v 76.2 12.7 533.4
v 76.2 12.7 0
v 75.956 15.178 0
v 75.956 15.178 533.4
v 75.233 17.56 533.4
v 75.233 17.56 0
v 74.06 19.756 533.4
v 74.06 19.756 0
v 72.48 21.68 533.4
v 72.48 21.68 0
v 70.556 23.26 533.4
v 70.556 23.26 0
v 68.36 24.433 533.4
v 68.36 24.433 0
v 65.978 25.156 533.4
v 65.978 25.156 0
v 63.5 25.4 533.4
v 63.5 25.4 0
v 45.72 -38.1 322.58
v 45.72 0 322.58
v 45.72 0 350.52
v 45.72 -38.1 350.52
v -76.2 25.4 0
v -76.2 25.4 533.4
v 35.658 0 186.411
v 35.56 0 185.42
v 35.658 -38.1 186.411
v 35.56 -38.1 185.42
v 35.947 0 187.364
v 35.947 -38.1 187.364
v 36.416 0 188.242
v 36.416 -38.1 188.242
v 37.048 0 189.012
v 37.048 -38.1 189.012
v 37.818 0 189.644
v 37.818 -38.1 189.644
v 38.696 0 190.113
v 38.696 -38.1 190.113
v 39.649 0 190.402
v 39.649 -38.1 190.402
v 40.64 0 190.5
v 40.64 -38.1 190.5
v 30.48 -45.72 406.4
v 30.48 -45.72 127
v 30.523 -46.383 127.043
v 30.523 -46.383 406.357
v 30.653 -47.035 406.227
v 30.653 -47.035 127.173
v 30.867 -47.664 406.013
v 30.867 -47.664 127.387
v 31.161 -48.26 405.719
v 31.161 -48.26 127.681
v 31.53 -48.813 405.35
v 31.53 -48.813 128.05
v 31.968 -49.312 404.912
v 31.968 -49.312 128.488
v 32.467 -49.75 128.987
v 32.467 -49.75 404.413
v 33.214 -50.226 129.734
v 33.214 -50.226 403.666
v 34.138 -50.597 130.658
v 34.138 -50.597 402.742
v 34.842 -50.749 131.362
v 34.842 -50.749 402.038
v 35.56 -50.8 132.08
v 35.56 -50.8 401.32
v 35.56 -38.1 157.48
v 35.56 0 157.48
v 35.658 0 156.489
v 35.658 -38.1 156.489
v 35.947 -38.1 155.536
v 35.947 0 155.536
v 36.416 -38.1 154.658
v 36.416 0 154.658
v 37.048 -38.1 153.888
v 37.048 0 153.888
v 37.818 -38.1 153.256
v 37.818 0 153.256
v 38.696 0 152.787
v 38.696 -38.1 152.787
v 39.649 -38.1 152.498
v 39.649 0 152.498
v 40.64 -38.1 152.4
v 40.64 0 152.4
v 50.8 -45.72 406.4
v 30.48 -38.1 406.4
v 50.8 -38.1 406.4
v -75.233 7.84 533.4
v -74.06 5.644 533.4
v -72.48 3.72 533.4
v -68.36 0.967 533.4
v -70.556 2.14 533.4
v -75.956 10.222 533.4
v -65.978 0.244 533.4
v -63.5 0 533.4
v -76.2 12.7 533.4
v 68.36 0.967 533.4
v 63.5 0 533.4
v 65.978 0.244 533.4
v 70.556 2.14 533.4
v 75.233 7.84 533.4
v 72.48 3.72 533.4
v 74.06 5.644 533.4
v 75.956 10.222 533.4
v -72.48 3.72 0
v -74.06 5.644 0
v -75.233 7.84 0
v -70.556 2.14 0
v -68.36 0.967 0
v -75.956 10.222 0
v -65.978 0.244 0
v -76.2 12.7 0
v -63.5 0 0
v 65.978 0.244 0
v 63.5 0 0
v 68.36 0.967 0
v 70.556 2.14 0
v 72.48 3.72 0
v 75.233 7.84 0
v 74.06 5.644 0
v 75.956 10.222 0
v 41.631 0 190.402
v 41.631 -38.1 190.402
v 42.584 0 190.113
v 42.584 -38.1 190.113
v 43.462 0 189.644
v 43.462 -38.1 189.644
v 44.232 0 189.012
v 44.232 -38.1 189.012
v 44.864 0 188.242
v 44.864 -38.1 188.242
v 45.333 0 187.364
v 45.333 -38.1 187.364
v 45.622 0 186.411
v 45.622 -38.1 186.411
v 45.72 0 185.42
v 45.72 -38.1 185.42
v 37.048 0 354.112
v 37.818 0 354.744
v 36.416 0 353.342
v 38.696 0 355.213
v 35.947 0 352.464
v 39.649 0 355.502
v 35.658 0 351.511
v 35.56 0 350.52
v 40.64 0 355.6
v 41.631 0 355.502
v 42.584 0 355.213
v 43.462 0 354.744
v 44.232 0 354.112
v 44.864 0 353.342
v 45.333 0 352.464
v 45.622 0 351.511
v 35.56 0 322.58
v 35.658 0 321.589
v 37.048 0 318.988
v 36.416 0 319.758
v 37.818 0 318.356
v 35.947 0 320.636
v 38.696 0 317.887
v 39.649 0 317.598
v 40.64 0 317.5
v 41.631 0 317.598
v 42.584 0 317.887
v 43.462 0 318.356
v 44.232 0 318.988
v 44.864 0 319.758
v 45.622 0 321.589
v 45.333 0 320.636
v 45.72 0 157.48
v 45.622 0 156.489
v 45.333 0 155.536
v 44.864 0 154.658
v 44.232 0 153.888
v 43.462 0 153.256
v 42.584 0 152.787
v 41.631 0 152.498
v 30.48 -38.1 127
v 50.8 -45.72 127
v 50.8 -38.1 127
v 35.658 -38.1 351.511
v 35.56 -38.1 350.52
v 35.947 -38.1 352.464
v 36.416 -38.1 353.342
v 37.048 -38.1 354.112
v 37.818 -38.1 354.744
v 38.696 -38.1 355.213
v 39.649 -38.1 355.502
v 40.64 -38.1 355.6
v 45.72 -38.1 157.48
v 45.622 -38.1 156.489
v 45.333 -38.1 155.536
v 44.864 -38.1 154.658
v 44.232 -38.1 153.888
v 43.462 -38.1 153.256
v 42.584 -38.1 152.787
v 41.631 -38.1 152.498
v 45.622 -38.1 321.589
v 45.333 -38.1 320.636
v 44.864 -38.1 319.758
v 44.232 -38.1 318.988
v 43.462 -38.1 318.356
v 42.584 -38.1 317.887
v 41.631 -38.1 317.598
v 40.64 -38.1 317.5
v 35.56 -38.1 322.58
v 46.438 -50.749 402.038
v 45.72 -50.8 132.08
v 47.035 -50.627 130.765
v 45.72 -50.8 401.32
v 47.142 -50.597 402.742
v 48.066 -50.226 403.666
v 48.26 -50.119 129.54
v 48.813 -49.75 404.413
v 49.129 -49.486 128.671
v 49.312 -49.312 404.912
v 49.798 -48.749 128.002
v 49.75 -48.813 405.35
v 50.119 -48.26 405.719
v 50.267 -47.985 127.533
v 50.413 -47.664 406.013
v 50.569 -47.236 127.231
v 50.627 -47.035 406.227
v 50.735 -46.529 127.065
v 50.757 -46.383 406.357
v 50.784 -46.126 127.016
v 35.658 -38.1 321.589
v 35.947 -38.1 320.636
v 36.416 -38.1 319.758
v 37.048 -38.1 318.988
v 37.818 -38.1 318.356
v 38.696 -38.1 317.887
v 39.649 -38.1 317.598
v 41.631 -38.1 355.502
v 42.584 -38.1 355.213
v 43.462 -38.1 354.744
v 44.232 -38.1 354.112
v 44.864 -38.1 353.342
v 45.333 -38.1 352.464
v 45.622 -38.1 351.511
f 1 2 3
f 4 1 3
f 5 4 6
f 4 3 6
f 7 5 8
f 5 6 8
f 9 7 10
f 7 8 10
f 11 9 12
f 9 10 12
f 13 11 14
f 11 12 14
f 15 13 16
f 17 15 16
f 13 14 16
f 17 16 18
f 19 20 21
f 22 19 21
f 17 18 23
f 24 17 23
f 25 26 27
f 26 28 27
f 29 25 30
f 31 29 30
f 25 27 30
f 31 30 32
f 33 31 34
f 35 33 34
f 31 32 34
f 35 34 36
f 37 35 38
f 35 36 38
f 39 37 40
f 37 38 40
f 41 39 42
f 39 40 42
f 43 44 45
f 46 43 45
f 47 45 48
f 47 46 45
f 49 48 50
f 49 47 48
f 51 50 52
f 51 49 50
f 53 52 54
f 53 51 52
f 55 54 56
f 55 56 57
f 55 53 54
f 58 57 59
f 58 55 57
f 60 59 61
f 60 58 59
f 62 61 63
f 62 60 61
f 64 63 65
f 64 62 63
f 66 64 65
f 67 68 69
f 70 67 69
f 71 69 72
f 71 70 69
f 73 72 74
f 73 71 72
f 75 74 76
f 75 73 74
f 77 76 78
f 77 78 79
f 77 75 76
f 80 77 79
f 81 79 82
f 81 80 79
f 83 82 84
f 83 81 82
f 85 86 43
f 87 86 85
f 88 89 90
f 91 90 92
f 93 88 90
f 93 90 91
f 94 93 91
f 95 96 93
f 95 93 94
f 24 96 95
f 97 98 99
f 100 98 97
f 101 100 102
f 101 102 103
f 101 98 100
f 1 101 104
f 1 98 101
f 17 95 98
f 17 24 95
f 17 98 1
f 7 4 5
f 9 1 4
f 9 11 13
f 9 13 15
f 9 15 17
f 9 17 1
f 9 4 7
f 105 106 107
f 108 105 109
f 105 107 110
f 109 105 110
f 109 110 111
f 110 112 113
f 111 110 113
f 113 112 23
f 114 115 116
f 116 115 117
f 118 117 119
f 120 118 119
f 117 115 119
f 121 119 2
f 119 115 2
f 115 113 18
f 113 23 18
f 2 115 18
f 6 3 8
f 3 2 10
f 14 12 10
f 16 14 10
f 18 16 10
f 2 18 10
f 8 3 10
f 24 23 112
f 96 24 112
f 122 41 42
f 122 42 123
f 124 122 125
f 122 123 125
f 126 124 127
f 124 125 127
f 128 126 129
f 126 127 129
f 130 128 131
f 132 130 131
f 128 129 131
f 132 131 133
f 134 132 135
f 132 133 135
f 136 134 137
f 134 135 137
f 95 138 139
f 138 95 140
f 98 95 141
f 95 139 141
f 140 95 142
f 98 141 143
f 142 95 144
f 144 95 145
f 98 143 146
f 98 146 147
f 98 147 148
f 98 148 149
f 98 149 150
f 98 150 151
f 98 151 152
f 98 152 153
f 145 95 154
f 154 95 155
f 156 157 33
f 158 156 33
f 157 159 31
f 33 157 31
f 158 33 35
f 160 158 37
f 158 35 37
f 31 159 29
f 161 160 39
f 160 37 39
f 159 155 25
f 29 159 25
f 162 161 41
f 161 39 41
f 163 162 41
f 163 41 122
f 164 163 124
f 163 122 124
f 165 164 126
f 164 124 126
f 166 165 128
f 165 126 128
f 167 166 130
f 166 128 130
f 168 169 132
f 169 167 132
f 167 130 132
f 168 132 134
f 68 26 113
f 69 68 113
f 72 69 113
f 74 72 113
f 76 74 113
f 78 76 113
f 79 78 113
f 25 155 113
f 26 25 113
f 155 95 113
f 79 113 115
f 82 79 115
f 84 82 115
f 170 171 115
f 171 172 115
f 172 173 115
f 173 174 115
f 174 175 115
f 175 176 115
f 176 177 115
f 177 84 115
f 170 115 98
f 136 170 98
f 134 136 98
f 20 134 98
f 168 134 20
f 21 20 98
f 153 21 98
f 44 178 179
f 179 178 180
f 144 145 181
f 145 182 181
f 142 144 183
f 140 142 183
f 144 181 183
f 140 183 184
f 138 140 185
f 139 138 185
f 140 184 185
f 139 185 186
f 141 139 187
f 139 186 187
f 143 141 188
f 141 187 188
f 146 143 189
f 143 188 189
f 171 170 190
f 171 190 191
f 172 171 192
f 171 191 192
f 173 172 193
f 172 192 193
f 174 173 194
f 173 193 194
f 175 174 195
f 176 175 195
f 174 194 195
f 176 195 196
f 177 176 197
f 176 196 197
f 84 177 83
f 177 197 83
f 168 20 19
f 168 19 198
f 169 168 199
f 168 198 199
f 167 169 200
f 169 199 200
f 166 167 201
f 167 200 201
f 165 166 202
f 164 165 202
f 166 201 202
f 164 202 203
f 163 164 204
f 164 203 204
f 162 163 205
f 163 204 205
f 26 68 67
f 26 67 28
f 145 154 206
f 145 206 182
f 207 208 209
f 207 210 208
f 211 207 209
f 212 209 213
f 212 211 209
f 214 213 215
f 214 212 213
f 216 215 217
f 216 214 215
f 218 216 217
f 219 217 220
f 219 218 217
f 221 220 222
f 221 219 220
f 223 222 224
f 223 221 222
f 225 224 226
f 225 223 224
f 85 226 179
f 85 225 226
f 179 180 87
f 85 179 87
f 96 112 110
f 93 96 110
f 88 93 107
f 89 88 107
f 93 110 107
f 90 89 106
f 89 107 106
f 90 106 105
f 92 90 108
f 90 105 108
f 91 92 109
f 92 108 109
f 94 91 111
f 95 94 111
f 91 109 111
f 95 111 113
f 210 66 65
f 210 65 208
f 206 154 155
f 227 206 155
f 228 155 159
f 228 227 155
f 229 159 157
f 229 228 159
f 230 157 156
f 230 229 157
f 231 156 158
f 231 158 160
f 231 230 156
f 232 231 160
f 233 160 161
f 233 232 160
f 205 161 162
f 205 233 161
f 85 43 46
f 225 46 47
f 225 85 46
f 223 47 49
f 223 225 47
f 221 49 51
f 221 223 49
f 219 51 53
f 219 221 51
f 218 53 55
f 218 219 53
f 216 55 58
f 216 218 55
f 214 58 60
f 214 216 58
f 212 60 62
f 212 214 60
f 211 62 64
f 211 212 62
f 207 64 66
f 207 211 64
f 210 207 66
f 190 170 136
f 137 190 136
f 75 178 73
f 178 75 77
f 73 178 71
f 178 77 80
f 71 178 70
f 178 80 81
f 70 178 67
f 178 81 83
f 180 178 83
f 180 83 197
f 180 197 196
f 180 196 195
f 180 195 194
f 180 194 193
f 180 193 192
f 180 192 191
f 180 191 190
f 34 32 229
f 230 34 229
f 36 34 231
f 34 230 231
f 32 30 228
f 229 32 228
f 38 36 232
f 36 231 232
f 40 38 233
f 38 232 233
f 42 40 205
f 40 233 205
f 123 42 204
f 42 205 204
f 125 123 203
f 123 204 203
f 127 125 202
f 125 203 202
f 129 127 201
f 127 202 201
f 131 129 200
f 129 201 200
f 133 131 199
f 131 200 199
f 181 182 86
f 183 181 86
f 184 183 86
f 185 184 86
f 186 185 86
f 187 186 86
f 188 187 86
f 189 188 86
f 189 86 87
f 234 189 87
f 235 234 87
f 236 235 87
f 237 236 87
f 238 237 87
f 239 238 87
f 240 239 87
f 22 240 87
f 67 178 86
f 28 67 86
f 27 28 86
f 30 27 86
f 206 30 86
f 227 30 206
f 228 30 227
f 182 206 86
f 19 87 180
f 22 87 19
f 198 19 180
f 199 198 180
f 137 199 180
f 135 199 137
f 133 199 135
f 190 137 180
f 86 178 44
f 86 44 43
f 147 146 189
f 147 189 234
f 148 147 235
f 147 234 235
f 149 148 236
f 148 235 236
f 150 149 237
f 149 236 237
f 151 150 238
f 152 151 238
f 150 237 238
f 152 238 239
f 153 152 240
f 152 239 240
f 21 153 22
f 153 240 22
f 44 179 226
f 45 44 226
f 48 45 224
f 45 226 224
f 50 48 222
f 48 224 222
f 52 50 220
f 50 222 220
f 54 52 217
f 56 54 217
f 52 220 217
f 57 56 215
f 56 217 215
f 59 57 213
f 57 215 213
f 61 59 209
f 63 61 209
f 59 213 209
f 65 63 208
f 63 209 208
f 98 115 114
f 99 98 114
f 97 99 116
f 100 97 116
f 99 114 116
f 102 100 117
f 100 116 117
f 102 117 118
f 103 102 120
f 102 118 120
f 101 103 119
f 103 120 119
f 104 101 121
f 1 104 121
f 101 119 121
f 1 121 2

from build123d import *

# Parameters (mm, degrees)
F1_DEPTH = 533.4
F4_W     = 10.16
F4_H     = 38.1
F5_DEPTH = 38.1
F6_R     = 5.07999
F3_W     = 20.32
F3_H     = 279.4
F7_DEPTH = 12.7
F8_R     = 5.08


# Not quite as in the source:
# - a fillet or chamfer is up to 0.001 mm smaller than in the source, because OpenCascade refuses the exact size


with BuildPart() as f1:
    # F0 (on Top) → F1 (new body)
    with BuildSketch(Plane.XY):
        with BuildLine():
            Line((63.5, 25.4), (-76.2, 25.4))
            Line((-76.2, 25.4), (-76.2, 12.7))
            ThreePointArc((-76.2, 12.7), (-72.4802561211, 3.7197438789), (-63.5, 0))
            Line((-63.5, 0), (63.5, 0))
            ThreePointArc((63.5, 0), (72.4802561211, 3.7197438789), (76.2, 12.7))
            ThreePointArc((76.2, 12.7), (72.4802561211, 21.6802561211), (63.5, 25.4))
        make_face()
    extrude(amount=F1_DEPTH)

    # F4 (on face) → F5 (join, through all)
    with BuildSketch(Plane.XZ):
        with Locations((40.64, 336.55)):
            Rectangle(F4_W, F4_H)
        with Locations((40.64, 171.45)):
            Rectangle(F4_W, F4_H)
    extrude(amount=F5_DEPTH)

    # F6 (radius 5.08 in the source; OpenCascade refuses exactly that, so slightly less here)
    f6_edges = [f1.edges().sort_by_distance(p)[0] for p in [
        (35.56, -19.05, 355.6),
        (45.72, -19.05, 355.6),
        (45.72, -19.05, 317.5),
        (35.56, -19.05, 317.5),
        (35.56, -19.05, 190.5),
        (45.72, -19.05, 190.5),
        (35.56, -19.05, 152.4),
        (45.72, -19.05, 152.4),
    ]]
    fillet(f6_edges, radius=F6_R)

    # F3 (on offset) → F7 (join)
    with BuildSketch(Plane.XZ.offset(38.1)):
        with Locations((40.64, 266.7)):
            Rectangle(F3_W, F3_H)
    extrude(amount=F7_DEPTH)

    # F8
    f8_edges = [f1.edges().sort_by_distance(p)[0] for p in [
        (40.64, -50.8, 406.4),
        (30.48, -50.8, 266.7),
        (50.8, -50.8, 266.7),
        (40.64, -50.8, 127),
    ]]
    fillet(f8_edges, radius=F8_R)


solid = f1.part
